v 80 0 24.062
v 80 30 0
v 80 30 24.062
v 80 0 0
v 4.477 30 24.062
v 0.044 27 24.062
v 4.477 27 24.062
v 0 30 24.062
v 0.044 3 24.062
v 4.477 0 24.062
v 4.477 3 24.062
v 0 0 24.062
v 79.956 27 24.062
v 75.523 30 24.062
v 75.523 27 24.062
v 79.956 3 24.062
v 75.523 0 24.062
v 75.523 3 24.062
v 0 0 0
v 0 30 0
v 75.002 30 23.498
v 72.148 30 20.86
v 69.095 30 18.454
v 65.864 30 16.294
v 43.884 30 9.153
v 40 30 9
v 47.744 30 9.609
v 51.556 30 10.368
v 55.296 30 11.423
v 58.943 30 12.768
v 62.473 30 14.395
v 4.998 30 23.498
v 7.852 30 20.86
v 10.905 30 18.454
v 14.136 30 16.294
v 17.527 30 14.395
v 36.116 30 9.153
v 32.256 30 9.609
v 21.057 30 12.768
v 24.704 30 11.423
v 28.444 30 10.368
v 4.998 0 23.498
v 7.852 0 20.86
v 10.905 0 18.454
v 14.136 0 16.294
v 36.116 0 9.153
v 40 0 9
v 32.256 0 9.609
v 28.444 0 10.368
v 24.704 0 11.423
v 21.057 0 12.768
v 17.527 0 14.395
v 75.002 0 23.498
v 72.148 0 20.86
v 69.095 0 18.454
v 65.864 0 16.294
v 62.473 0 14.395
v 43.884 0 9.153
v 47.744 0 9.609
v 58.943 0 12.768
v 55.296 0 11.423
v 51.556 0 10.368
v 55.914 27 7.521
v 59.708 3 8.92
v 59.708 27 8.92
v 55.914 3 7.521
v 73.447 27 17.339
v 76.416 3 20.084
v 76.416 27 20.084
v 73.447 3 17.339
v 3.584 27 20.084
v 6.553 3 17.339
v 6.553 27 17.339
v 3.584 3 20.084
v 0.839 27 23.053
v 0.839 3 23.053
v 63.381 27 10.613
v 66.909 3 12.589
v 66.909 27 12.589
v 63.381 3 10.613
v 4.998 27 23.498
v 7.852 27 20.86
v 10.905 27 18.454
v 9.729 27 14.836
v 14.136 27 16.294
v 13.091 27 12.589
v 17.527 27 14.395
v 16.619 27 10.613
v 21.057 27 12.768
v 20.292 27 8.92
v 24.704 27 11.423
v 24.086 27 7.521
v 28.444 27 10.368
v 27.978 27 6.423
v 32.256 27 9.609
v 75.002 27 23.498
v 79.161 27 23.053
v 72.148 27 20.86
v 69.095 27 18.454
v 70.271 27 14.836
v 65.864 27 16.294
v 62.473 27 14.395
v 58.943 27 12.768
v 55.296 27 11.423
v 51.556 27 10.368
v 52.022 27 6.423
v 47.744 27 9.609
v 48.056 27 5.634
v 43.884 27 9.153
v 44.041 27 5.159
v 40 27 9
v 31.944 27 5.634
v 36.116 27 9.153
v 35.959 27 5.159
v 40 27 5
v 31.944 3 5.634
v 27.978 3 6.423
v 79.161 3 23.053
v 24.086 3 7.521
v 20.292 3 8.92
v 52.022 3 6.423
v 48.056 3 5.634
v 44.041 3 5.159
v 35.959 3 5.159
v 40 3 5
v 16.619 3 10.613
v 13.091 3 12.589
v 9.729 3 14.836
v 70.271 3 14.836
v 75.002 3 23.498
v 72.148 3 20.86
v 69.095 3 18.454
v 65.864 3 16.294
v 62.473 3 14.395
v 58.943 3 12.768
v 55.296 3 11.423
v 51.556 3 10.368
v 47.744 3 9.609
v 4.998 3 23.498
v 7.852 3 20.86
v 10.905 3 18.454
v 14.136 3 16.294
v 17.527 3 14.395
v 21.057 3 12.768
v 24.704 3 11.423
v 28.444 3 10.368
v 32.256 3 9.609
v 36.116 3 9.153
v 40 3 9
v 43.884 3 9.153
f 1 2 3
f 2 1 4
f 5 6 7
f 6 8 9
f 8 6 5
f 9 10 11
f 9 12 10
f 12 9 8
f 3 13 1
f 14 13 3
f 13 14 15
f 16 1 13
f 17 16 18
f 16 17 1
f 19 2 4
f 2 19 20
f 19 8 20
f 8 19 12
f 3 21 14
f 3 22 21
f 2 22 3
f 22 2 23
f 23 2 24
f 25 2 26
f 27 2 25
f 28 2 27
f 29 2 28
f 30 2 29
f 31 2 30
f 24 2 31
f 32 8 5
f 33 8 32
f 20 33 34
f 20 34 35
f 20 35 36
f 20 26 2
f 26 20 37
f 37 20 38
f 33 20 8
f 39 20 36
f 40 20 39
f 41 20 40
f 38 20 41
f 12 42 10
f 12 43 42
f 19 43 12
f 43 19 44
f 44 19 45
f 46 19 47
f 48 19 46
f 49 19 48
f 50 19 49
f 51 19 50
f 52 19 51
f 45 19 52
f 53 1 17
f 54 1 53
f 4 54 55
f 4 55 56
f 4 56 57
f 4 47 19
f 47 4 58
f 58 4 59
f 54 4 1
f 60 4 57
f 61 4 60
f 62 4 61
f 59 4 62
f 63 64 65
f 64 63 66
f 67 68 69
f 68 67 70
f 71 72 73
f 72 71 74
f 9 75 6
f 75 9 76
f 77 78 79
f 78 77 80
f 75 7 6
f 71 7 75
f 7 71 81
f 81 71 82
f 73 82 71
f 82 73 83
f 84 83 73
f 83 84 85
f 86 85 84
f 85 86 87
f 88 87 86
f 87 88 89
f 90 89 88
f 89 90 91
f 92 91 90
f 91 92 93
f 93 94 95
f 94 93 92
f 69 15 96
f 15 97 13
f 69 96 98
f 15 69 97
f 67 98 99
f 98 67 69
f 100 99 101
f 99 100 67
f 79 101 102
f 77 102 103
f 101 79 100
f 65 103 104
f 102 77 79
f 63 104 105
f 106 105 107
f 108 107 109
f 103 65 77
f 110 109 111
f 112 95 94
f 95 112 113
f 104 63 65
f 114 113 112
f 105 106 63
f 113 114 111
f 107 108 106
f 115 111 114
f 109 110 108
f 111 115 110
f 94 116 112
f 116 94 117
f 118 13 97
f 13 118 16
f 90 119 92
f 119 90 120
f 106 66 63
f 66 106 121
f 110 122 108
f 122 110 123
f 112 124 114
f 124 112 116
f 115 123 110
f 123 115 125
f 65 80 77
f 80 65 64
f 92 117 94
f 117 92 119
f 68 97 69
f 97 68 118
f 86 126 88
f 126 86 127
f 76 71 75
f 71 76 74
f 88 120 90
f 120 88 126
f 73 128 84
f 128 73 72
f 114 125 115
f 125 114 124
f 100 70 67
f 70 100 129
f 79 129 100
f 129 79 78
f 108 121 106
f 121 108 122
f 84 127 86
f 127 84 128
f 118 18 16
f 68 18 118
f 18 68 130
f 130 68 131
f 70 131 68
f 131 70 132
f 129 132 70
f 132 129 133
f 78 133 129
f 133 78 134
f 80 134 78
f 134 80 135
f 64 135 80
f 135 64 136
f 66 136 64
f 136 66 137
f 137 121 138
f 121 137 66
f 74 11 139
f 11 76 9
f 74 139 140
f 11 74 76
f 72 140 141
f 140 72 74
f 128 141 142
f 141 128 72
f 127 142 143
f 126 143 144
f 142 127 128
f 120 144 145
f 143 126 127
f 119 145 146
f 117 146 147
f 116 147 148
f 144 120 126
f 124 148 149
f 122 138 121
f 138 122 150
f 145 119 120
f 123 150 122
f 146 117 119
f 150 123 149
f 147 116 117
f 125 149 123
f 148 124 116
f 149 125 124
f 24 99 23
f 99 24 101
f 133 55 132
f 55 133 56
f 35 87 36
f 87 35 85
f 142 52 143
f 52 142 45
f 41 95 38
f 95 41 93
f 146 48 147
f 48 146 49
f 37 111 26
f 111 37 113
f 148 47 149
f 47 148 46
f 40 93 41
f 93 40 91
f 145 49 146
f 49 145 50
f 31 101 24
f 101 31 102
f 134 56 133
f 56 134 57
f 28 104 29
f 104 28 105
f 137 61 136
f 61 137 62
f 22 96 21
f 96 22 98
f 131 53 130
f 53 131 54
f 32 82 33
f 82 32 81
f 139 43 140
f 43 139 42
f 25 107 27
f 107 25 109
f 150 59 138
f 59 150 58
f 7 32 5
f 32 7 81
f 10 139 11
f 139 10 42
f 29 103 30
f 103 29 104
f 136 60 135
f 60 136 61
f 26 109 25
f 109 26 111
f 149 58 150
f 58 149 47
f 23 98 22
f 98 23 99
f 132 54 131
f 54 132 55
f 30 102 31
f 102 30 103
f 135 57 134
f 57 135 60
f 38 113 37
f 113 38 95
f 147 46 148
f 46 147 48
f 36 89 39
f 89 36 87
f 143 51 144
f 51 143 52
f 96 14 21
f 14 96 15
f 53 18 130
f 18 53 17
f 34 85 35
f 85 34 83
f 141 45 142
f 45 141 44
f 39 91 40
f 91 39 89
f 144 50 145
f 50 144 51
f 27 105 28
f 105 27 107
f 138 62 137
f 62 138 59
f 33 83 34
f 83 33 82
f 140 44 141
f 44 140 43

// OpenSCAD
/*
Red Hat Service Award ('puck') holder.

Model by Paul Wayper, copyright January 2024.

Licensed for reuse under the Creative Commons 4.0 By-SA license:

https://creativecommons.org/licenses/by-sa/4.0/
*/

award_width = 24;  // 23 for old five-year puck
award_diam = 103;  award_rad = award_diam/2;
side_thick = 3;  base_thick = 5;  step_thick = 2;
length = 80;
// Calculate height to fit disc diameter within given length;
height = award_rad - sqrt(award_rad^2 - (length/2)^2) + base_thick; 

$fn=$preview ? 40 : 80;

difference() {
    // the main block
    cube([length, award_width+side_thick*2, height]);
    // main space for award
    translate([length/2, 3, award_rad + base_thick]) rotate([-90, 0, 0])
      cylinder(h=award_width, d=award_diam);
    // surround
    translate([length/2, -0.01, award_rad + base_thick + step_thick]) rotate([-90, 0, 0])
      cylinder(h=award_width+(side_thick+0.01)*2, d=award_diam-4);
}
